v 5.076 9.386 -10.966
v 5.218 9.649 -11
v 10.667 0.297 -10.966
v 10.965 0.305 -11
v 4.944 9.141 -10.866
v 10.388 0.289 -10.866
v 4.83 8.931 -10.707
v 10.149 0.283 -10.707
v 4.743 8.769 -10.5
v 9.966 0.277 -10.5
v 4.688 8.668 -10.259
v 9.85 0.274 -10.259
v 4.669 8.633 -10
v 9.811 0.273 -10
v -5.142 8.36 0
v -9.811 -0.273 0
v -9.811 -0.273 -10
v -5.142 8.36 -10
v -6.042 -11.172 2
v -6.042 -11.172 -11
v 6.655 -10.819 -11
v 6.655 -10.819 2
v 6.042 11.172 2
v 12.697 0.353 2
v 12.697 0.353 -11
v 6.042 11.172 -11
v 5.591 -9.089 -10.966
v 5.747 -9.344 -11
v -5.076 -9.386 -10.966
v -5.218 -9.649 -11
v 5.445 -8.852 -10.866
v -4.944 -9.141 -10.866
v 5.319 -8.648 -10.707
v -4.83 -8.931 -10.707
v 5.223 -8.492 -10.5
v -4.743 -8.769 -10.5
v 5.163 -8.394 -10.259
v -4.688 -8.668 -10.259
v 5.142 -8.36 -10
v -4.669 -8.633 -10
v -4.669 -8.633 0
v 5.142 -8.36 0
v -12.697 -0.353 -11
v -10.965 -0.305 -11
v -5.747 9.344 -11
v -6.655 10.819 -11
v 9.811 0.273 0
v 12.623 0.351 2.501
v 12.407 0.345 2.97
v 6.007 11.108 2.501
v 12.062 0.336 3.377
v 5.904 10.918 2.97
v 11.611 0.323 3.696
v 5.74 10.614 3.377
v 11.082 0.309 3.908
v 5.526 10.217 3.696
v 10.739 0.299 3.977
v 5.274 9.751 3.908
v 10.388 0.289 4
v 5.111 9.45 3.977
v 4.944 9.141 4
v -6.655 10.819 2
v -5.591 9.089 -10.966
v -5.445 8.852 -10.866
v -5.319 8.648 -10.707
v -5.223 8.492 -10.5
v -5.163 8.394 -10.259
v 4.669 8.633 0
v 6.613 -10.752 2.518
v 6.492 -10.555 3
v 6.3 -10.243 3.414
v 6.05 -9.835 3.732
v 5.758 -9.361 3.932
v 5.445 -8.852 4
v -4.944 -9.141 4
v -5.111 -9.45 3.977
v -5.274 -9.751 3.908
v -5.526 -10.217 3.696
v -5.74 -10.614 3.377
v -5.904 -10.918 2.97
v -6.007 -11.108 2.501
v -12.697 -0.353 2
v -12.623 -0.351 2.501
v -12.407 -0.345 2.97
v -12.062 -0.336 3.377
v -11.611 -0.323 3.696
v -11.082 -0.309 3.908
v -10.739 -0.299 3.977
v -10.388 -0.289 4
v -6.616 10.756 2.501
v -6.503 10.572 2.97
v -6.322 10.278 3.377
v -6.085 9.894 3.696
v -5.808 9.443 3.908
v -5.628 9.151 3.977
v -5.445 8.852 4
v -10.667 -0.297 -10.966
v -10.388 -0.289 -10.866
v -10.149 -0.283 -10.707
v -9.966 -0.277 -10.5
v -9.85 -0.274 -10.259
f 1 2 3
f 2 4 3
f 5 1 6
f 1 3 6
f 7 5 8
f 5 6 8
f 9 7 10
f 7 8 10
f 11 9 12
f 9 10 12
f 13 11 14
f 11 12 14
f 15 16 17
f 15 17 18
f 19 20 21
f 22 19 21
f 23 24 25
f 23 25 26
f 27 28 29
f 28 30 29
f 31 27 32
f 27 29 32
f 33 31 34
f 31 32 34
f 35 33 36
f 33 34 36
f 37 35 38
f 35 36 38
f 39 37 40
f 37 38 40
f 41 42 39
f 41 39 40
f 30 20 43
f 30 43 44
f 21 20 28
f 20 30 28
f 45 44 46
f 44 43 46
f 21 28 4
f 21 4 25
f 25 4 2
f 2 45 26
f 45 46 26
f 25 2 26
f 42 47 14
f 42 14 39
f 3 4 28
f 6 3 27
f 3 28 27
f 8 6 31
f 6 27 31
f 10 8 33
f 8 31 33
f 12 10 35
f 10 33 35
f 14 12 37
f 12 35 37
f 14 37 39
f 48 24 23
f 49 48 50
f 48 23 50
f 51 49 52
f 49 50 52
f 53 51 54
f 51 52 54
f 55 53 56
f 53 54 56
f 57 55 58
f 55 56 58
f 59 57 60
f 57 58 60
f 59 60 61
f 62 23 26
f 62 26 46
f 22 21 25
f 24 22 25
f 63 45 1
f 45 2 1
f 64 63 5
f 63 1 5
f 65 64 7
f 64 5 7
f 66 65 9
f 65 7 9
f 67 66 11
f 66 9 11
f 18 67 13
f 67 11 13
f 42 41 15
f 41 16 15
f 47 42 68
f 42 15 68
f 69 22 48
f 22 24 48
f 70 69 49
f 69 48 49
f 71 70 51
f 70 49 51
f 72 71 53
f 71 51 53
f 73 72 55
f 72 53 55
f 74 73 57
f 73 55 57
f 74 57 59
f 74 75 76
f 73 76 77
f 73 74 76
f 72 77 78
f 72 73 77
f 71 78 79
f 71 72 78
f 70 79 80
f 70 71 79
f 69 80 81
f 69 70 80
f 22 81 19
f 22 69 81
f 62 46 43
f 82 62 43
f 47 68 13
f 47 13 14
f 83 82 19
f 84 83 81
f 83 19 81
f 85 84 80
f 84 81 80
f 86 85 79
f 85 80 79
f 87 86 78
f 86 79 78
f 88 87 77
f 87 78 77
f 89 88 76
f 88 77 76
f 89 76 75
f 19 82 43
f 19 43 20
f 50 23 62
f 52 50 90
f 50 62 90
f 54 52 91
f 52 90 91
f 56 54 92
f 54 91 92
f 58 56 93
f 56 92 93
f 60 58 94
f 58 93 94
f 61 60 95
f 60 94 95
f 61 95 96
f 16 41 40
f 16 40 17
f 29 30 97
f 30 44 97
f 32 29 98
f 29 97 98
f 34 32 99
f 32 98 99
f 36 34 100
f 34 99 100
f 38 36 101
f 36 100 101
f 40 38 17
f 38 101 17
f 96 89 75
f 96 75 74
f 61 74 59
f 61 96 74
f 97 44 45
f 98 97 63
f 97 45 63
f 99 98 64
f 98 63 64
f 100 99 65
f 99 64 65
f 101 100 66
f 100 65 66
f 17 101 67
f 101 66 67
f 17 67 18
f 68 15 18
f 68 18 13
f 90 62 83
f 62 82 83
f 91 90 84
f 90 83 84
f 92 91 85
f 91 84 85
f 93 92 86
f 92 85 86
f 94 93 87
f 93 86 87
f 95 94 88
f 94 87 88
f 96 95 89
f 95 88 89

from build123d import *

# Parameters (mm, degrees)
F1_DEPTH = 4
F2_DEPTH = 11
F3_R     = 2
F4_R     = 1


with BuildPart() as f1:
    # F0 (on Top) → F1 (new body)
    with BuildSketch(Plane.XY):
        Polygon((-12.696786, -0.35349), (-6.042262, -11.172484), (6.654524, -10.818994), (12.696786, 0.35349), (6.042262, 11.172484), (-6.654524, 10.818994), align=None)
        Polygon((-4.669021, -8.633283), (-9.811153, -0.273151), (-5.142132, 8.360132), (4.669021, 8.633283), (9.811153, 0.273151), (5.142132, -8.360132), align=None, mode=Mode.SUBTRACT)
        Polygon((-5.142132, 8.360132), (-9.811153, -0.273151), (-4.669021, -8.633283), (5.142132, -8.360132), (9.811153, 0.273151), (4.669021, 8.633283), align=None)
    extrude(amount=F1_DEPTH)

    # F0 (on Top) → F2 (join)
    with BuildSketch(Plane.XY):
        Polygon((-12.696786, -0.35349), (-6.042262, -11.172484), (6.654524, -10.818994), (12.696786, 0.35349), (6.042262, 11.172484), (-6.654524, 10.818994), align=None)
        Polygon((-4.669021, -8.633283), (-9.811153, -0.273151), (-5.142132, 8.360132), (4.669021, 8.633283), (9.811153, 0.273151), (5.142132, -8.360132), align=None, mode=Mode.SUBTRACT)
    extrude(amount=-F2_DEPTH)

    # F3
    f3_edges = [f1.edges().sort_by_distance(p)[0] for p in [
        (-0.306131, 10.995739, 4),
        (-9.675655, 5.232752, 4),
        (-9.369524, -5.762987, 4),
        (0.306131, -10.995739, 4),
        (9.675655, -5.232752, 4),
        (9.369524, 5.762987, 4),
    ]]
    fillet(f3_edges, radius=F3_R)

    # F4
    f4_edges = [f1.edges().sort_by_distance(p)[0] for p in [
        (-0.236556, 8.496708, -11),
        (-7.476643, 4.04349, -11),
        (-7.240087, -4.453217, -11),
        (0.236556, -8.496708, -11),
        (7.476643, -4.04349, -11),
        (7.240087, 4.453217, -11),
    ]]
    fillet(f4_edges, radius=F4_R)


solid = f1.part
